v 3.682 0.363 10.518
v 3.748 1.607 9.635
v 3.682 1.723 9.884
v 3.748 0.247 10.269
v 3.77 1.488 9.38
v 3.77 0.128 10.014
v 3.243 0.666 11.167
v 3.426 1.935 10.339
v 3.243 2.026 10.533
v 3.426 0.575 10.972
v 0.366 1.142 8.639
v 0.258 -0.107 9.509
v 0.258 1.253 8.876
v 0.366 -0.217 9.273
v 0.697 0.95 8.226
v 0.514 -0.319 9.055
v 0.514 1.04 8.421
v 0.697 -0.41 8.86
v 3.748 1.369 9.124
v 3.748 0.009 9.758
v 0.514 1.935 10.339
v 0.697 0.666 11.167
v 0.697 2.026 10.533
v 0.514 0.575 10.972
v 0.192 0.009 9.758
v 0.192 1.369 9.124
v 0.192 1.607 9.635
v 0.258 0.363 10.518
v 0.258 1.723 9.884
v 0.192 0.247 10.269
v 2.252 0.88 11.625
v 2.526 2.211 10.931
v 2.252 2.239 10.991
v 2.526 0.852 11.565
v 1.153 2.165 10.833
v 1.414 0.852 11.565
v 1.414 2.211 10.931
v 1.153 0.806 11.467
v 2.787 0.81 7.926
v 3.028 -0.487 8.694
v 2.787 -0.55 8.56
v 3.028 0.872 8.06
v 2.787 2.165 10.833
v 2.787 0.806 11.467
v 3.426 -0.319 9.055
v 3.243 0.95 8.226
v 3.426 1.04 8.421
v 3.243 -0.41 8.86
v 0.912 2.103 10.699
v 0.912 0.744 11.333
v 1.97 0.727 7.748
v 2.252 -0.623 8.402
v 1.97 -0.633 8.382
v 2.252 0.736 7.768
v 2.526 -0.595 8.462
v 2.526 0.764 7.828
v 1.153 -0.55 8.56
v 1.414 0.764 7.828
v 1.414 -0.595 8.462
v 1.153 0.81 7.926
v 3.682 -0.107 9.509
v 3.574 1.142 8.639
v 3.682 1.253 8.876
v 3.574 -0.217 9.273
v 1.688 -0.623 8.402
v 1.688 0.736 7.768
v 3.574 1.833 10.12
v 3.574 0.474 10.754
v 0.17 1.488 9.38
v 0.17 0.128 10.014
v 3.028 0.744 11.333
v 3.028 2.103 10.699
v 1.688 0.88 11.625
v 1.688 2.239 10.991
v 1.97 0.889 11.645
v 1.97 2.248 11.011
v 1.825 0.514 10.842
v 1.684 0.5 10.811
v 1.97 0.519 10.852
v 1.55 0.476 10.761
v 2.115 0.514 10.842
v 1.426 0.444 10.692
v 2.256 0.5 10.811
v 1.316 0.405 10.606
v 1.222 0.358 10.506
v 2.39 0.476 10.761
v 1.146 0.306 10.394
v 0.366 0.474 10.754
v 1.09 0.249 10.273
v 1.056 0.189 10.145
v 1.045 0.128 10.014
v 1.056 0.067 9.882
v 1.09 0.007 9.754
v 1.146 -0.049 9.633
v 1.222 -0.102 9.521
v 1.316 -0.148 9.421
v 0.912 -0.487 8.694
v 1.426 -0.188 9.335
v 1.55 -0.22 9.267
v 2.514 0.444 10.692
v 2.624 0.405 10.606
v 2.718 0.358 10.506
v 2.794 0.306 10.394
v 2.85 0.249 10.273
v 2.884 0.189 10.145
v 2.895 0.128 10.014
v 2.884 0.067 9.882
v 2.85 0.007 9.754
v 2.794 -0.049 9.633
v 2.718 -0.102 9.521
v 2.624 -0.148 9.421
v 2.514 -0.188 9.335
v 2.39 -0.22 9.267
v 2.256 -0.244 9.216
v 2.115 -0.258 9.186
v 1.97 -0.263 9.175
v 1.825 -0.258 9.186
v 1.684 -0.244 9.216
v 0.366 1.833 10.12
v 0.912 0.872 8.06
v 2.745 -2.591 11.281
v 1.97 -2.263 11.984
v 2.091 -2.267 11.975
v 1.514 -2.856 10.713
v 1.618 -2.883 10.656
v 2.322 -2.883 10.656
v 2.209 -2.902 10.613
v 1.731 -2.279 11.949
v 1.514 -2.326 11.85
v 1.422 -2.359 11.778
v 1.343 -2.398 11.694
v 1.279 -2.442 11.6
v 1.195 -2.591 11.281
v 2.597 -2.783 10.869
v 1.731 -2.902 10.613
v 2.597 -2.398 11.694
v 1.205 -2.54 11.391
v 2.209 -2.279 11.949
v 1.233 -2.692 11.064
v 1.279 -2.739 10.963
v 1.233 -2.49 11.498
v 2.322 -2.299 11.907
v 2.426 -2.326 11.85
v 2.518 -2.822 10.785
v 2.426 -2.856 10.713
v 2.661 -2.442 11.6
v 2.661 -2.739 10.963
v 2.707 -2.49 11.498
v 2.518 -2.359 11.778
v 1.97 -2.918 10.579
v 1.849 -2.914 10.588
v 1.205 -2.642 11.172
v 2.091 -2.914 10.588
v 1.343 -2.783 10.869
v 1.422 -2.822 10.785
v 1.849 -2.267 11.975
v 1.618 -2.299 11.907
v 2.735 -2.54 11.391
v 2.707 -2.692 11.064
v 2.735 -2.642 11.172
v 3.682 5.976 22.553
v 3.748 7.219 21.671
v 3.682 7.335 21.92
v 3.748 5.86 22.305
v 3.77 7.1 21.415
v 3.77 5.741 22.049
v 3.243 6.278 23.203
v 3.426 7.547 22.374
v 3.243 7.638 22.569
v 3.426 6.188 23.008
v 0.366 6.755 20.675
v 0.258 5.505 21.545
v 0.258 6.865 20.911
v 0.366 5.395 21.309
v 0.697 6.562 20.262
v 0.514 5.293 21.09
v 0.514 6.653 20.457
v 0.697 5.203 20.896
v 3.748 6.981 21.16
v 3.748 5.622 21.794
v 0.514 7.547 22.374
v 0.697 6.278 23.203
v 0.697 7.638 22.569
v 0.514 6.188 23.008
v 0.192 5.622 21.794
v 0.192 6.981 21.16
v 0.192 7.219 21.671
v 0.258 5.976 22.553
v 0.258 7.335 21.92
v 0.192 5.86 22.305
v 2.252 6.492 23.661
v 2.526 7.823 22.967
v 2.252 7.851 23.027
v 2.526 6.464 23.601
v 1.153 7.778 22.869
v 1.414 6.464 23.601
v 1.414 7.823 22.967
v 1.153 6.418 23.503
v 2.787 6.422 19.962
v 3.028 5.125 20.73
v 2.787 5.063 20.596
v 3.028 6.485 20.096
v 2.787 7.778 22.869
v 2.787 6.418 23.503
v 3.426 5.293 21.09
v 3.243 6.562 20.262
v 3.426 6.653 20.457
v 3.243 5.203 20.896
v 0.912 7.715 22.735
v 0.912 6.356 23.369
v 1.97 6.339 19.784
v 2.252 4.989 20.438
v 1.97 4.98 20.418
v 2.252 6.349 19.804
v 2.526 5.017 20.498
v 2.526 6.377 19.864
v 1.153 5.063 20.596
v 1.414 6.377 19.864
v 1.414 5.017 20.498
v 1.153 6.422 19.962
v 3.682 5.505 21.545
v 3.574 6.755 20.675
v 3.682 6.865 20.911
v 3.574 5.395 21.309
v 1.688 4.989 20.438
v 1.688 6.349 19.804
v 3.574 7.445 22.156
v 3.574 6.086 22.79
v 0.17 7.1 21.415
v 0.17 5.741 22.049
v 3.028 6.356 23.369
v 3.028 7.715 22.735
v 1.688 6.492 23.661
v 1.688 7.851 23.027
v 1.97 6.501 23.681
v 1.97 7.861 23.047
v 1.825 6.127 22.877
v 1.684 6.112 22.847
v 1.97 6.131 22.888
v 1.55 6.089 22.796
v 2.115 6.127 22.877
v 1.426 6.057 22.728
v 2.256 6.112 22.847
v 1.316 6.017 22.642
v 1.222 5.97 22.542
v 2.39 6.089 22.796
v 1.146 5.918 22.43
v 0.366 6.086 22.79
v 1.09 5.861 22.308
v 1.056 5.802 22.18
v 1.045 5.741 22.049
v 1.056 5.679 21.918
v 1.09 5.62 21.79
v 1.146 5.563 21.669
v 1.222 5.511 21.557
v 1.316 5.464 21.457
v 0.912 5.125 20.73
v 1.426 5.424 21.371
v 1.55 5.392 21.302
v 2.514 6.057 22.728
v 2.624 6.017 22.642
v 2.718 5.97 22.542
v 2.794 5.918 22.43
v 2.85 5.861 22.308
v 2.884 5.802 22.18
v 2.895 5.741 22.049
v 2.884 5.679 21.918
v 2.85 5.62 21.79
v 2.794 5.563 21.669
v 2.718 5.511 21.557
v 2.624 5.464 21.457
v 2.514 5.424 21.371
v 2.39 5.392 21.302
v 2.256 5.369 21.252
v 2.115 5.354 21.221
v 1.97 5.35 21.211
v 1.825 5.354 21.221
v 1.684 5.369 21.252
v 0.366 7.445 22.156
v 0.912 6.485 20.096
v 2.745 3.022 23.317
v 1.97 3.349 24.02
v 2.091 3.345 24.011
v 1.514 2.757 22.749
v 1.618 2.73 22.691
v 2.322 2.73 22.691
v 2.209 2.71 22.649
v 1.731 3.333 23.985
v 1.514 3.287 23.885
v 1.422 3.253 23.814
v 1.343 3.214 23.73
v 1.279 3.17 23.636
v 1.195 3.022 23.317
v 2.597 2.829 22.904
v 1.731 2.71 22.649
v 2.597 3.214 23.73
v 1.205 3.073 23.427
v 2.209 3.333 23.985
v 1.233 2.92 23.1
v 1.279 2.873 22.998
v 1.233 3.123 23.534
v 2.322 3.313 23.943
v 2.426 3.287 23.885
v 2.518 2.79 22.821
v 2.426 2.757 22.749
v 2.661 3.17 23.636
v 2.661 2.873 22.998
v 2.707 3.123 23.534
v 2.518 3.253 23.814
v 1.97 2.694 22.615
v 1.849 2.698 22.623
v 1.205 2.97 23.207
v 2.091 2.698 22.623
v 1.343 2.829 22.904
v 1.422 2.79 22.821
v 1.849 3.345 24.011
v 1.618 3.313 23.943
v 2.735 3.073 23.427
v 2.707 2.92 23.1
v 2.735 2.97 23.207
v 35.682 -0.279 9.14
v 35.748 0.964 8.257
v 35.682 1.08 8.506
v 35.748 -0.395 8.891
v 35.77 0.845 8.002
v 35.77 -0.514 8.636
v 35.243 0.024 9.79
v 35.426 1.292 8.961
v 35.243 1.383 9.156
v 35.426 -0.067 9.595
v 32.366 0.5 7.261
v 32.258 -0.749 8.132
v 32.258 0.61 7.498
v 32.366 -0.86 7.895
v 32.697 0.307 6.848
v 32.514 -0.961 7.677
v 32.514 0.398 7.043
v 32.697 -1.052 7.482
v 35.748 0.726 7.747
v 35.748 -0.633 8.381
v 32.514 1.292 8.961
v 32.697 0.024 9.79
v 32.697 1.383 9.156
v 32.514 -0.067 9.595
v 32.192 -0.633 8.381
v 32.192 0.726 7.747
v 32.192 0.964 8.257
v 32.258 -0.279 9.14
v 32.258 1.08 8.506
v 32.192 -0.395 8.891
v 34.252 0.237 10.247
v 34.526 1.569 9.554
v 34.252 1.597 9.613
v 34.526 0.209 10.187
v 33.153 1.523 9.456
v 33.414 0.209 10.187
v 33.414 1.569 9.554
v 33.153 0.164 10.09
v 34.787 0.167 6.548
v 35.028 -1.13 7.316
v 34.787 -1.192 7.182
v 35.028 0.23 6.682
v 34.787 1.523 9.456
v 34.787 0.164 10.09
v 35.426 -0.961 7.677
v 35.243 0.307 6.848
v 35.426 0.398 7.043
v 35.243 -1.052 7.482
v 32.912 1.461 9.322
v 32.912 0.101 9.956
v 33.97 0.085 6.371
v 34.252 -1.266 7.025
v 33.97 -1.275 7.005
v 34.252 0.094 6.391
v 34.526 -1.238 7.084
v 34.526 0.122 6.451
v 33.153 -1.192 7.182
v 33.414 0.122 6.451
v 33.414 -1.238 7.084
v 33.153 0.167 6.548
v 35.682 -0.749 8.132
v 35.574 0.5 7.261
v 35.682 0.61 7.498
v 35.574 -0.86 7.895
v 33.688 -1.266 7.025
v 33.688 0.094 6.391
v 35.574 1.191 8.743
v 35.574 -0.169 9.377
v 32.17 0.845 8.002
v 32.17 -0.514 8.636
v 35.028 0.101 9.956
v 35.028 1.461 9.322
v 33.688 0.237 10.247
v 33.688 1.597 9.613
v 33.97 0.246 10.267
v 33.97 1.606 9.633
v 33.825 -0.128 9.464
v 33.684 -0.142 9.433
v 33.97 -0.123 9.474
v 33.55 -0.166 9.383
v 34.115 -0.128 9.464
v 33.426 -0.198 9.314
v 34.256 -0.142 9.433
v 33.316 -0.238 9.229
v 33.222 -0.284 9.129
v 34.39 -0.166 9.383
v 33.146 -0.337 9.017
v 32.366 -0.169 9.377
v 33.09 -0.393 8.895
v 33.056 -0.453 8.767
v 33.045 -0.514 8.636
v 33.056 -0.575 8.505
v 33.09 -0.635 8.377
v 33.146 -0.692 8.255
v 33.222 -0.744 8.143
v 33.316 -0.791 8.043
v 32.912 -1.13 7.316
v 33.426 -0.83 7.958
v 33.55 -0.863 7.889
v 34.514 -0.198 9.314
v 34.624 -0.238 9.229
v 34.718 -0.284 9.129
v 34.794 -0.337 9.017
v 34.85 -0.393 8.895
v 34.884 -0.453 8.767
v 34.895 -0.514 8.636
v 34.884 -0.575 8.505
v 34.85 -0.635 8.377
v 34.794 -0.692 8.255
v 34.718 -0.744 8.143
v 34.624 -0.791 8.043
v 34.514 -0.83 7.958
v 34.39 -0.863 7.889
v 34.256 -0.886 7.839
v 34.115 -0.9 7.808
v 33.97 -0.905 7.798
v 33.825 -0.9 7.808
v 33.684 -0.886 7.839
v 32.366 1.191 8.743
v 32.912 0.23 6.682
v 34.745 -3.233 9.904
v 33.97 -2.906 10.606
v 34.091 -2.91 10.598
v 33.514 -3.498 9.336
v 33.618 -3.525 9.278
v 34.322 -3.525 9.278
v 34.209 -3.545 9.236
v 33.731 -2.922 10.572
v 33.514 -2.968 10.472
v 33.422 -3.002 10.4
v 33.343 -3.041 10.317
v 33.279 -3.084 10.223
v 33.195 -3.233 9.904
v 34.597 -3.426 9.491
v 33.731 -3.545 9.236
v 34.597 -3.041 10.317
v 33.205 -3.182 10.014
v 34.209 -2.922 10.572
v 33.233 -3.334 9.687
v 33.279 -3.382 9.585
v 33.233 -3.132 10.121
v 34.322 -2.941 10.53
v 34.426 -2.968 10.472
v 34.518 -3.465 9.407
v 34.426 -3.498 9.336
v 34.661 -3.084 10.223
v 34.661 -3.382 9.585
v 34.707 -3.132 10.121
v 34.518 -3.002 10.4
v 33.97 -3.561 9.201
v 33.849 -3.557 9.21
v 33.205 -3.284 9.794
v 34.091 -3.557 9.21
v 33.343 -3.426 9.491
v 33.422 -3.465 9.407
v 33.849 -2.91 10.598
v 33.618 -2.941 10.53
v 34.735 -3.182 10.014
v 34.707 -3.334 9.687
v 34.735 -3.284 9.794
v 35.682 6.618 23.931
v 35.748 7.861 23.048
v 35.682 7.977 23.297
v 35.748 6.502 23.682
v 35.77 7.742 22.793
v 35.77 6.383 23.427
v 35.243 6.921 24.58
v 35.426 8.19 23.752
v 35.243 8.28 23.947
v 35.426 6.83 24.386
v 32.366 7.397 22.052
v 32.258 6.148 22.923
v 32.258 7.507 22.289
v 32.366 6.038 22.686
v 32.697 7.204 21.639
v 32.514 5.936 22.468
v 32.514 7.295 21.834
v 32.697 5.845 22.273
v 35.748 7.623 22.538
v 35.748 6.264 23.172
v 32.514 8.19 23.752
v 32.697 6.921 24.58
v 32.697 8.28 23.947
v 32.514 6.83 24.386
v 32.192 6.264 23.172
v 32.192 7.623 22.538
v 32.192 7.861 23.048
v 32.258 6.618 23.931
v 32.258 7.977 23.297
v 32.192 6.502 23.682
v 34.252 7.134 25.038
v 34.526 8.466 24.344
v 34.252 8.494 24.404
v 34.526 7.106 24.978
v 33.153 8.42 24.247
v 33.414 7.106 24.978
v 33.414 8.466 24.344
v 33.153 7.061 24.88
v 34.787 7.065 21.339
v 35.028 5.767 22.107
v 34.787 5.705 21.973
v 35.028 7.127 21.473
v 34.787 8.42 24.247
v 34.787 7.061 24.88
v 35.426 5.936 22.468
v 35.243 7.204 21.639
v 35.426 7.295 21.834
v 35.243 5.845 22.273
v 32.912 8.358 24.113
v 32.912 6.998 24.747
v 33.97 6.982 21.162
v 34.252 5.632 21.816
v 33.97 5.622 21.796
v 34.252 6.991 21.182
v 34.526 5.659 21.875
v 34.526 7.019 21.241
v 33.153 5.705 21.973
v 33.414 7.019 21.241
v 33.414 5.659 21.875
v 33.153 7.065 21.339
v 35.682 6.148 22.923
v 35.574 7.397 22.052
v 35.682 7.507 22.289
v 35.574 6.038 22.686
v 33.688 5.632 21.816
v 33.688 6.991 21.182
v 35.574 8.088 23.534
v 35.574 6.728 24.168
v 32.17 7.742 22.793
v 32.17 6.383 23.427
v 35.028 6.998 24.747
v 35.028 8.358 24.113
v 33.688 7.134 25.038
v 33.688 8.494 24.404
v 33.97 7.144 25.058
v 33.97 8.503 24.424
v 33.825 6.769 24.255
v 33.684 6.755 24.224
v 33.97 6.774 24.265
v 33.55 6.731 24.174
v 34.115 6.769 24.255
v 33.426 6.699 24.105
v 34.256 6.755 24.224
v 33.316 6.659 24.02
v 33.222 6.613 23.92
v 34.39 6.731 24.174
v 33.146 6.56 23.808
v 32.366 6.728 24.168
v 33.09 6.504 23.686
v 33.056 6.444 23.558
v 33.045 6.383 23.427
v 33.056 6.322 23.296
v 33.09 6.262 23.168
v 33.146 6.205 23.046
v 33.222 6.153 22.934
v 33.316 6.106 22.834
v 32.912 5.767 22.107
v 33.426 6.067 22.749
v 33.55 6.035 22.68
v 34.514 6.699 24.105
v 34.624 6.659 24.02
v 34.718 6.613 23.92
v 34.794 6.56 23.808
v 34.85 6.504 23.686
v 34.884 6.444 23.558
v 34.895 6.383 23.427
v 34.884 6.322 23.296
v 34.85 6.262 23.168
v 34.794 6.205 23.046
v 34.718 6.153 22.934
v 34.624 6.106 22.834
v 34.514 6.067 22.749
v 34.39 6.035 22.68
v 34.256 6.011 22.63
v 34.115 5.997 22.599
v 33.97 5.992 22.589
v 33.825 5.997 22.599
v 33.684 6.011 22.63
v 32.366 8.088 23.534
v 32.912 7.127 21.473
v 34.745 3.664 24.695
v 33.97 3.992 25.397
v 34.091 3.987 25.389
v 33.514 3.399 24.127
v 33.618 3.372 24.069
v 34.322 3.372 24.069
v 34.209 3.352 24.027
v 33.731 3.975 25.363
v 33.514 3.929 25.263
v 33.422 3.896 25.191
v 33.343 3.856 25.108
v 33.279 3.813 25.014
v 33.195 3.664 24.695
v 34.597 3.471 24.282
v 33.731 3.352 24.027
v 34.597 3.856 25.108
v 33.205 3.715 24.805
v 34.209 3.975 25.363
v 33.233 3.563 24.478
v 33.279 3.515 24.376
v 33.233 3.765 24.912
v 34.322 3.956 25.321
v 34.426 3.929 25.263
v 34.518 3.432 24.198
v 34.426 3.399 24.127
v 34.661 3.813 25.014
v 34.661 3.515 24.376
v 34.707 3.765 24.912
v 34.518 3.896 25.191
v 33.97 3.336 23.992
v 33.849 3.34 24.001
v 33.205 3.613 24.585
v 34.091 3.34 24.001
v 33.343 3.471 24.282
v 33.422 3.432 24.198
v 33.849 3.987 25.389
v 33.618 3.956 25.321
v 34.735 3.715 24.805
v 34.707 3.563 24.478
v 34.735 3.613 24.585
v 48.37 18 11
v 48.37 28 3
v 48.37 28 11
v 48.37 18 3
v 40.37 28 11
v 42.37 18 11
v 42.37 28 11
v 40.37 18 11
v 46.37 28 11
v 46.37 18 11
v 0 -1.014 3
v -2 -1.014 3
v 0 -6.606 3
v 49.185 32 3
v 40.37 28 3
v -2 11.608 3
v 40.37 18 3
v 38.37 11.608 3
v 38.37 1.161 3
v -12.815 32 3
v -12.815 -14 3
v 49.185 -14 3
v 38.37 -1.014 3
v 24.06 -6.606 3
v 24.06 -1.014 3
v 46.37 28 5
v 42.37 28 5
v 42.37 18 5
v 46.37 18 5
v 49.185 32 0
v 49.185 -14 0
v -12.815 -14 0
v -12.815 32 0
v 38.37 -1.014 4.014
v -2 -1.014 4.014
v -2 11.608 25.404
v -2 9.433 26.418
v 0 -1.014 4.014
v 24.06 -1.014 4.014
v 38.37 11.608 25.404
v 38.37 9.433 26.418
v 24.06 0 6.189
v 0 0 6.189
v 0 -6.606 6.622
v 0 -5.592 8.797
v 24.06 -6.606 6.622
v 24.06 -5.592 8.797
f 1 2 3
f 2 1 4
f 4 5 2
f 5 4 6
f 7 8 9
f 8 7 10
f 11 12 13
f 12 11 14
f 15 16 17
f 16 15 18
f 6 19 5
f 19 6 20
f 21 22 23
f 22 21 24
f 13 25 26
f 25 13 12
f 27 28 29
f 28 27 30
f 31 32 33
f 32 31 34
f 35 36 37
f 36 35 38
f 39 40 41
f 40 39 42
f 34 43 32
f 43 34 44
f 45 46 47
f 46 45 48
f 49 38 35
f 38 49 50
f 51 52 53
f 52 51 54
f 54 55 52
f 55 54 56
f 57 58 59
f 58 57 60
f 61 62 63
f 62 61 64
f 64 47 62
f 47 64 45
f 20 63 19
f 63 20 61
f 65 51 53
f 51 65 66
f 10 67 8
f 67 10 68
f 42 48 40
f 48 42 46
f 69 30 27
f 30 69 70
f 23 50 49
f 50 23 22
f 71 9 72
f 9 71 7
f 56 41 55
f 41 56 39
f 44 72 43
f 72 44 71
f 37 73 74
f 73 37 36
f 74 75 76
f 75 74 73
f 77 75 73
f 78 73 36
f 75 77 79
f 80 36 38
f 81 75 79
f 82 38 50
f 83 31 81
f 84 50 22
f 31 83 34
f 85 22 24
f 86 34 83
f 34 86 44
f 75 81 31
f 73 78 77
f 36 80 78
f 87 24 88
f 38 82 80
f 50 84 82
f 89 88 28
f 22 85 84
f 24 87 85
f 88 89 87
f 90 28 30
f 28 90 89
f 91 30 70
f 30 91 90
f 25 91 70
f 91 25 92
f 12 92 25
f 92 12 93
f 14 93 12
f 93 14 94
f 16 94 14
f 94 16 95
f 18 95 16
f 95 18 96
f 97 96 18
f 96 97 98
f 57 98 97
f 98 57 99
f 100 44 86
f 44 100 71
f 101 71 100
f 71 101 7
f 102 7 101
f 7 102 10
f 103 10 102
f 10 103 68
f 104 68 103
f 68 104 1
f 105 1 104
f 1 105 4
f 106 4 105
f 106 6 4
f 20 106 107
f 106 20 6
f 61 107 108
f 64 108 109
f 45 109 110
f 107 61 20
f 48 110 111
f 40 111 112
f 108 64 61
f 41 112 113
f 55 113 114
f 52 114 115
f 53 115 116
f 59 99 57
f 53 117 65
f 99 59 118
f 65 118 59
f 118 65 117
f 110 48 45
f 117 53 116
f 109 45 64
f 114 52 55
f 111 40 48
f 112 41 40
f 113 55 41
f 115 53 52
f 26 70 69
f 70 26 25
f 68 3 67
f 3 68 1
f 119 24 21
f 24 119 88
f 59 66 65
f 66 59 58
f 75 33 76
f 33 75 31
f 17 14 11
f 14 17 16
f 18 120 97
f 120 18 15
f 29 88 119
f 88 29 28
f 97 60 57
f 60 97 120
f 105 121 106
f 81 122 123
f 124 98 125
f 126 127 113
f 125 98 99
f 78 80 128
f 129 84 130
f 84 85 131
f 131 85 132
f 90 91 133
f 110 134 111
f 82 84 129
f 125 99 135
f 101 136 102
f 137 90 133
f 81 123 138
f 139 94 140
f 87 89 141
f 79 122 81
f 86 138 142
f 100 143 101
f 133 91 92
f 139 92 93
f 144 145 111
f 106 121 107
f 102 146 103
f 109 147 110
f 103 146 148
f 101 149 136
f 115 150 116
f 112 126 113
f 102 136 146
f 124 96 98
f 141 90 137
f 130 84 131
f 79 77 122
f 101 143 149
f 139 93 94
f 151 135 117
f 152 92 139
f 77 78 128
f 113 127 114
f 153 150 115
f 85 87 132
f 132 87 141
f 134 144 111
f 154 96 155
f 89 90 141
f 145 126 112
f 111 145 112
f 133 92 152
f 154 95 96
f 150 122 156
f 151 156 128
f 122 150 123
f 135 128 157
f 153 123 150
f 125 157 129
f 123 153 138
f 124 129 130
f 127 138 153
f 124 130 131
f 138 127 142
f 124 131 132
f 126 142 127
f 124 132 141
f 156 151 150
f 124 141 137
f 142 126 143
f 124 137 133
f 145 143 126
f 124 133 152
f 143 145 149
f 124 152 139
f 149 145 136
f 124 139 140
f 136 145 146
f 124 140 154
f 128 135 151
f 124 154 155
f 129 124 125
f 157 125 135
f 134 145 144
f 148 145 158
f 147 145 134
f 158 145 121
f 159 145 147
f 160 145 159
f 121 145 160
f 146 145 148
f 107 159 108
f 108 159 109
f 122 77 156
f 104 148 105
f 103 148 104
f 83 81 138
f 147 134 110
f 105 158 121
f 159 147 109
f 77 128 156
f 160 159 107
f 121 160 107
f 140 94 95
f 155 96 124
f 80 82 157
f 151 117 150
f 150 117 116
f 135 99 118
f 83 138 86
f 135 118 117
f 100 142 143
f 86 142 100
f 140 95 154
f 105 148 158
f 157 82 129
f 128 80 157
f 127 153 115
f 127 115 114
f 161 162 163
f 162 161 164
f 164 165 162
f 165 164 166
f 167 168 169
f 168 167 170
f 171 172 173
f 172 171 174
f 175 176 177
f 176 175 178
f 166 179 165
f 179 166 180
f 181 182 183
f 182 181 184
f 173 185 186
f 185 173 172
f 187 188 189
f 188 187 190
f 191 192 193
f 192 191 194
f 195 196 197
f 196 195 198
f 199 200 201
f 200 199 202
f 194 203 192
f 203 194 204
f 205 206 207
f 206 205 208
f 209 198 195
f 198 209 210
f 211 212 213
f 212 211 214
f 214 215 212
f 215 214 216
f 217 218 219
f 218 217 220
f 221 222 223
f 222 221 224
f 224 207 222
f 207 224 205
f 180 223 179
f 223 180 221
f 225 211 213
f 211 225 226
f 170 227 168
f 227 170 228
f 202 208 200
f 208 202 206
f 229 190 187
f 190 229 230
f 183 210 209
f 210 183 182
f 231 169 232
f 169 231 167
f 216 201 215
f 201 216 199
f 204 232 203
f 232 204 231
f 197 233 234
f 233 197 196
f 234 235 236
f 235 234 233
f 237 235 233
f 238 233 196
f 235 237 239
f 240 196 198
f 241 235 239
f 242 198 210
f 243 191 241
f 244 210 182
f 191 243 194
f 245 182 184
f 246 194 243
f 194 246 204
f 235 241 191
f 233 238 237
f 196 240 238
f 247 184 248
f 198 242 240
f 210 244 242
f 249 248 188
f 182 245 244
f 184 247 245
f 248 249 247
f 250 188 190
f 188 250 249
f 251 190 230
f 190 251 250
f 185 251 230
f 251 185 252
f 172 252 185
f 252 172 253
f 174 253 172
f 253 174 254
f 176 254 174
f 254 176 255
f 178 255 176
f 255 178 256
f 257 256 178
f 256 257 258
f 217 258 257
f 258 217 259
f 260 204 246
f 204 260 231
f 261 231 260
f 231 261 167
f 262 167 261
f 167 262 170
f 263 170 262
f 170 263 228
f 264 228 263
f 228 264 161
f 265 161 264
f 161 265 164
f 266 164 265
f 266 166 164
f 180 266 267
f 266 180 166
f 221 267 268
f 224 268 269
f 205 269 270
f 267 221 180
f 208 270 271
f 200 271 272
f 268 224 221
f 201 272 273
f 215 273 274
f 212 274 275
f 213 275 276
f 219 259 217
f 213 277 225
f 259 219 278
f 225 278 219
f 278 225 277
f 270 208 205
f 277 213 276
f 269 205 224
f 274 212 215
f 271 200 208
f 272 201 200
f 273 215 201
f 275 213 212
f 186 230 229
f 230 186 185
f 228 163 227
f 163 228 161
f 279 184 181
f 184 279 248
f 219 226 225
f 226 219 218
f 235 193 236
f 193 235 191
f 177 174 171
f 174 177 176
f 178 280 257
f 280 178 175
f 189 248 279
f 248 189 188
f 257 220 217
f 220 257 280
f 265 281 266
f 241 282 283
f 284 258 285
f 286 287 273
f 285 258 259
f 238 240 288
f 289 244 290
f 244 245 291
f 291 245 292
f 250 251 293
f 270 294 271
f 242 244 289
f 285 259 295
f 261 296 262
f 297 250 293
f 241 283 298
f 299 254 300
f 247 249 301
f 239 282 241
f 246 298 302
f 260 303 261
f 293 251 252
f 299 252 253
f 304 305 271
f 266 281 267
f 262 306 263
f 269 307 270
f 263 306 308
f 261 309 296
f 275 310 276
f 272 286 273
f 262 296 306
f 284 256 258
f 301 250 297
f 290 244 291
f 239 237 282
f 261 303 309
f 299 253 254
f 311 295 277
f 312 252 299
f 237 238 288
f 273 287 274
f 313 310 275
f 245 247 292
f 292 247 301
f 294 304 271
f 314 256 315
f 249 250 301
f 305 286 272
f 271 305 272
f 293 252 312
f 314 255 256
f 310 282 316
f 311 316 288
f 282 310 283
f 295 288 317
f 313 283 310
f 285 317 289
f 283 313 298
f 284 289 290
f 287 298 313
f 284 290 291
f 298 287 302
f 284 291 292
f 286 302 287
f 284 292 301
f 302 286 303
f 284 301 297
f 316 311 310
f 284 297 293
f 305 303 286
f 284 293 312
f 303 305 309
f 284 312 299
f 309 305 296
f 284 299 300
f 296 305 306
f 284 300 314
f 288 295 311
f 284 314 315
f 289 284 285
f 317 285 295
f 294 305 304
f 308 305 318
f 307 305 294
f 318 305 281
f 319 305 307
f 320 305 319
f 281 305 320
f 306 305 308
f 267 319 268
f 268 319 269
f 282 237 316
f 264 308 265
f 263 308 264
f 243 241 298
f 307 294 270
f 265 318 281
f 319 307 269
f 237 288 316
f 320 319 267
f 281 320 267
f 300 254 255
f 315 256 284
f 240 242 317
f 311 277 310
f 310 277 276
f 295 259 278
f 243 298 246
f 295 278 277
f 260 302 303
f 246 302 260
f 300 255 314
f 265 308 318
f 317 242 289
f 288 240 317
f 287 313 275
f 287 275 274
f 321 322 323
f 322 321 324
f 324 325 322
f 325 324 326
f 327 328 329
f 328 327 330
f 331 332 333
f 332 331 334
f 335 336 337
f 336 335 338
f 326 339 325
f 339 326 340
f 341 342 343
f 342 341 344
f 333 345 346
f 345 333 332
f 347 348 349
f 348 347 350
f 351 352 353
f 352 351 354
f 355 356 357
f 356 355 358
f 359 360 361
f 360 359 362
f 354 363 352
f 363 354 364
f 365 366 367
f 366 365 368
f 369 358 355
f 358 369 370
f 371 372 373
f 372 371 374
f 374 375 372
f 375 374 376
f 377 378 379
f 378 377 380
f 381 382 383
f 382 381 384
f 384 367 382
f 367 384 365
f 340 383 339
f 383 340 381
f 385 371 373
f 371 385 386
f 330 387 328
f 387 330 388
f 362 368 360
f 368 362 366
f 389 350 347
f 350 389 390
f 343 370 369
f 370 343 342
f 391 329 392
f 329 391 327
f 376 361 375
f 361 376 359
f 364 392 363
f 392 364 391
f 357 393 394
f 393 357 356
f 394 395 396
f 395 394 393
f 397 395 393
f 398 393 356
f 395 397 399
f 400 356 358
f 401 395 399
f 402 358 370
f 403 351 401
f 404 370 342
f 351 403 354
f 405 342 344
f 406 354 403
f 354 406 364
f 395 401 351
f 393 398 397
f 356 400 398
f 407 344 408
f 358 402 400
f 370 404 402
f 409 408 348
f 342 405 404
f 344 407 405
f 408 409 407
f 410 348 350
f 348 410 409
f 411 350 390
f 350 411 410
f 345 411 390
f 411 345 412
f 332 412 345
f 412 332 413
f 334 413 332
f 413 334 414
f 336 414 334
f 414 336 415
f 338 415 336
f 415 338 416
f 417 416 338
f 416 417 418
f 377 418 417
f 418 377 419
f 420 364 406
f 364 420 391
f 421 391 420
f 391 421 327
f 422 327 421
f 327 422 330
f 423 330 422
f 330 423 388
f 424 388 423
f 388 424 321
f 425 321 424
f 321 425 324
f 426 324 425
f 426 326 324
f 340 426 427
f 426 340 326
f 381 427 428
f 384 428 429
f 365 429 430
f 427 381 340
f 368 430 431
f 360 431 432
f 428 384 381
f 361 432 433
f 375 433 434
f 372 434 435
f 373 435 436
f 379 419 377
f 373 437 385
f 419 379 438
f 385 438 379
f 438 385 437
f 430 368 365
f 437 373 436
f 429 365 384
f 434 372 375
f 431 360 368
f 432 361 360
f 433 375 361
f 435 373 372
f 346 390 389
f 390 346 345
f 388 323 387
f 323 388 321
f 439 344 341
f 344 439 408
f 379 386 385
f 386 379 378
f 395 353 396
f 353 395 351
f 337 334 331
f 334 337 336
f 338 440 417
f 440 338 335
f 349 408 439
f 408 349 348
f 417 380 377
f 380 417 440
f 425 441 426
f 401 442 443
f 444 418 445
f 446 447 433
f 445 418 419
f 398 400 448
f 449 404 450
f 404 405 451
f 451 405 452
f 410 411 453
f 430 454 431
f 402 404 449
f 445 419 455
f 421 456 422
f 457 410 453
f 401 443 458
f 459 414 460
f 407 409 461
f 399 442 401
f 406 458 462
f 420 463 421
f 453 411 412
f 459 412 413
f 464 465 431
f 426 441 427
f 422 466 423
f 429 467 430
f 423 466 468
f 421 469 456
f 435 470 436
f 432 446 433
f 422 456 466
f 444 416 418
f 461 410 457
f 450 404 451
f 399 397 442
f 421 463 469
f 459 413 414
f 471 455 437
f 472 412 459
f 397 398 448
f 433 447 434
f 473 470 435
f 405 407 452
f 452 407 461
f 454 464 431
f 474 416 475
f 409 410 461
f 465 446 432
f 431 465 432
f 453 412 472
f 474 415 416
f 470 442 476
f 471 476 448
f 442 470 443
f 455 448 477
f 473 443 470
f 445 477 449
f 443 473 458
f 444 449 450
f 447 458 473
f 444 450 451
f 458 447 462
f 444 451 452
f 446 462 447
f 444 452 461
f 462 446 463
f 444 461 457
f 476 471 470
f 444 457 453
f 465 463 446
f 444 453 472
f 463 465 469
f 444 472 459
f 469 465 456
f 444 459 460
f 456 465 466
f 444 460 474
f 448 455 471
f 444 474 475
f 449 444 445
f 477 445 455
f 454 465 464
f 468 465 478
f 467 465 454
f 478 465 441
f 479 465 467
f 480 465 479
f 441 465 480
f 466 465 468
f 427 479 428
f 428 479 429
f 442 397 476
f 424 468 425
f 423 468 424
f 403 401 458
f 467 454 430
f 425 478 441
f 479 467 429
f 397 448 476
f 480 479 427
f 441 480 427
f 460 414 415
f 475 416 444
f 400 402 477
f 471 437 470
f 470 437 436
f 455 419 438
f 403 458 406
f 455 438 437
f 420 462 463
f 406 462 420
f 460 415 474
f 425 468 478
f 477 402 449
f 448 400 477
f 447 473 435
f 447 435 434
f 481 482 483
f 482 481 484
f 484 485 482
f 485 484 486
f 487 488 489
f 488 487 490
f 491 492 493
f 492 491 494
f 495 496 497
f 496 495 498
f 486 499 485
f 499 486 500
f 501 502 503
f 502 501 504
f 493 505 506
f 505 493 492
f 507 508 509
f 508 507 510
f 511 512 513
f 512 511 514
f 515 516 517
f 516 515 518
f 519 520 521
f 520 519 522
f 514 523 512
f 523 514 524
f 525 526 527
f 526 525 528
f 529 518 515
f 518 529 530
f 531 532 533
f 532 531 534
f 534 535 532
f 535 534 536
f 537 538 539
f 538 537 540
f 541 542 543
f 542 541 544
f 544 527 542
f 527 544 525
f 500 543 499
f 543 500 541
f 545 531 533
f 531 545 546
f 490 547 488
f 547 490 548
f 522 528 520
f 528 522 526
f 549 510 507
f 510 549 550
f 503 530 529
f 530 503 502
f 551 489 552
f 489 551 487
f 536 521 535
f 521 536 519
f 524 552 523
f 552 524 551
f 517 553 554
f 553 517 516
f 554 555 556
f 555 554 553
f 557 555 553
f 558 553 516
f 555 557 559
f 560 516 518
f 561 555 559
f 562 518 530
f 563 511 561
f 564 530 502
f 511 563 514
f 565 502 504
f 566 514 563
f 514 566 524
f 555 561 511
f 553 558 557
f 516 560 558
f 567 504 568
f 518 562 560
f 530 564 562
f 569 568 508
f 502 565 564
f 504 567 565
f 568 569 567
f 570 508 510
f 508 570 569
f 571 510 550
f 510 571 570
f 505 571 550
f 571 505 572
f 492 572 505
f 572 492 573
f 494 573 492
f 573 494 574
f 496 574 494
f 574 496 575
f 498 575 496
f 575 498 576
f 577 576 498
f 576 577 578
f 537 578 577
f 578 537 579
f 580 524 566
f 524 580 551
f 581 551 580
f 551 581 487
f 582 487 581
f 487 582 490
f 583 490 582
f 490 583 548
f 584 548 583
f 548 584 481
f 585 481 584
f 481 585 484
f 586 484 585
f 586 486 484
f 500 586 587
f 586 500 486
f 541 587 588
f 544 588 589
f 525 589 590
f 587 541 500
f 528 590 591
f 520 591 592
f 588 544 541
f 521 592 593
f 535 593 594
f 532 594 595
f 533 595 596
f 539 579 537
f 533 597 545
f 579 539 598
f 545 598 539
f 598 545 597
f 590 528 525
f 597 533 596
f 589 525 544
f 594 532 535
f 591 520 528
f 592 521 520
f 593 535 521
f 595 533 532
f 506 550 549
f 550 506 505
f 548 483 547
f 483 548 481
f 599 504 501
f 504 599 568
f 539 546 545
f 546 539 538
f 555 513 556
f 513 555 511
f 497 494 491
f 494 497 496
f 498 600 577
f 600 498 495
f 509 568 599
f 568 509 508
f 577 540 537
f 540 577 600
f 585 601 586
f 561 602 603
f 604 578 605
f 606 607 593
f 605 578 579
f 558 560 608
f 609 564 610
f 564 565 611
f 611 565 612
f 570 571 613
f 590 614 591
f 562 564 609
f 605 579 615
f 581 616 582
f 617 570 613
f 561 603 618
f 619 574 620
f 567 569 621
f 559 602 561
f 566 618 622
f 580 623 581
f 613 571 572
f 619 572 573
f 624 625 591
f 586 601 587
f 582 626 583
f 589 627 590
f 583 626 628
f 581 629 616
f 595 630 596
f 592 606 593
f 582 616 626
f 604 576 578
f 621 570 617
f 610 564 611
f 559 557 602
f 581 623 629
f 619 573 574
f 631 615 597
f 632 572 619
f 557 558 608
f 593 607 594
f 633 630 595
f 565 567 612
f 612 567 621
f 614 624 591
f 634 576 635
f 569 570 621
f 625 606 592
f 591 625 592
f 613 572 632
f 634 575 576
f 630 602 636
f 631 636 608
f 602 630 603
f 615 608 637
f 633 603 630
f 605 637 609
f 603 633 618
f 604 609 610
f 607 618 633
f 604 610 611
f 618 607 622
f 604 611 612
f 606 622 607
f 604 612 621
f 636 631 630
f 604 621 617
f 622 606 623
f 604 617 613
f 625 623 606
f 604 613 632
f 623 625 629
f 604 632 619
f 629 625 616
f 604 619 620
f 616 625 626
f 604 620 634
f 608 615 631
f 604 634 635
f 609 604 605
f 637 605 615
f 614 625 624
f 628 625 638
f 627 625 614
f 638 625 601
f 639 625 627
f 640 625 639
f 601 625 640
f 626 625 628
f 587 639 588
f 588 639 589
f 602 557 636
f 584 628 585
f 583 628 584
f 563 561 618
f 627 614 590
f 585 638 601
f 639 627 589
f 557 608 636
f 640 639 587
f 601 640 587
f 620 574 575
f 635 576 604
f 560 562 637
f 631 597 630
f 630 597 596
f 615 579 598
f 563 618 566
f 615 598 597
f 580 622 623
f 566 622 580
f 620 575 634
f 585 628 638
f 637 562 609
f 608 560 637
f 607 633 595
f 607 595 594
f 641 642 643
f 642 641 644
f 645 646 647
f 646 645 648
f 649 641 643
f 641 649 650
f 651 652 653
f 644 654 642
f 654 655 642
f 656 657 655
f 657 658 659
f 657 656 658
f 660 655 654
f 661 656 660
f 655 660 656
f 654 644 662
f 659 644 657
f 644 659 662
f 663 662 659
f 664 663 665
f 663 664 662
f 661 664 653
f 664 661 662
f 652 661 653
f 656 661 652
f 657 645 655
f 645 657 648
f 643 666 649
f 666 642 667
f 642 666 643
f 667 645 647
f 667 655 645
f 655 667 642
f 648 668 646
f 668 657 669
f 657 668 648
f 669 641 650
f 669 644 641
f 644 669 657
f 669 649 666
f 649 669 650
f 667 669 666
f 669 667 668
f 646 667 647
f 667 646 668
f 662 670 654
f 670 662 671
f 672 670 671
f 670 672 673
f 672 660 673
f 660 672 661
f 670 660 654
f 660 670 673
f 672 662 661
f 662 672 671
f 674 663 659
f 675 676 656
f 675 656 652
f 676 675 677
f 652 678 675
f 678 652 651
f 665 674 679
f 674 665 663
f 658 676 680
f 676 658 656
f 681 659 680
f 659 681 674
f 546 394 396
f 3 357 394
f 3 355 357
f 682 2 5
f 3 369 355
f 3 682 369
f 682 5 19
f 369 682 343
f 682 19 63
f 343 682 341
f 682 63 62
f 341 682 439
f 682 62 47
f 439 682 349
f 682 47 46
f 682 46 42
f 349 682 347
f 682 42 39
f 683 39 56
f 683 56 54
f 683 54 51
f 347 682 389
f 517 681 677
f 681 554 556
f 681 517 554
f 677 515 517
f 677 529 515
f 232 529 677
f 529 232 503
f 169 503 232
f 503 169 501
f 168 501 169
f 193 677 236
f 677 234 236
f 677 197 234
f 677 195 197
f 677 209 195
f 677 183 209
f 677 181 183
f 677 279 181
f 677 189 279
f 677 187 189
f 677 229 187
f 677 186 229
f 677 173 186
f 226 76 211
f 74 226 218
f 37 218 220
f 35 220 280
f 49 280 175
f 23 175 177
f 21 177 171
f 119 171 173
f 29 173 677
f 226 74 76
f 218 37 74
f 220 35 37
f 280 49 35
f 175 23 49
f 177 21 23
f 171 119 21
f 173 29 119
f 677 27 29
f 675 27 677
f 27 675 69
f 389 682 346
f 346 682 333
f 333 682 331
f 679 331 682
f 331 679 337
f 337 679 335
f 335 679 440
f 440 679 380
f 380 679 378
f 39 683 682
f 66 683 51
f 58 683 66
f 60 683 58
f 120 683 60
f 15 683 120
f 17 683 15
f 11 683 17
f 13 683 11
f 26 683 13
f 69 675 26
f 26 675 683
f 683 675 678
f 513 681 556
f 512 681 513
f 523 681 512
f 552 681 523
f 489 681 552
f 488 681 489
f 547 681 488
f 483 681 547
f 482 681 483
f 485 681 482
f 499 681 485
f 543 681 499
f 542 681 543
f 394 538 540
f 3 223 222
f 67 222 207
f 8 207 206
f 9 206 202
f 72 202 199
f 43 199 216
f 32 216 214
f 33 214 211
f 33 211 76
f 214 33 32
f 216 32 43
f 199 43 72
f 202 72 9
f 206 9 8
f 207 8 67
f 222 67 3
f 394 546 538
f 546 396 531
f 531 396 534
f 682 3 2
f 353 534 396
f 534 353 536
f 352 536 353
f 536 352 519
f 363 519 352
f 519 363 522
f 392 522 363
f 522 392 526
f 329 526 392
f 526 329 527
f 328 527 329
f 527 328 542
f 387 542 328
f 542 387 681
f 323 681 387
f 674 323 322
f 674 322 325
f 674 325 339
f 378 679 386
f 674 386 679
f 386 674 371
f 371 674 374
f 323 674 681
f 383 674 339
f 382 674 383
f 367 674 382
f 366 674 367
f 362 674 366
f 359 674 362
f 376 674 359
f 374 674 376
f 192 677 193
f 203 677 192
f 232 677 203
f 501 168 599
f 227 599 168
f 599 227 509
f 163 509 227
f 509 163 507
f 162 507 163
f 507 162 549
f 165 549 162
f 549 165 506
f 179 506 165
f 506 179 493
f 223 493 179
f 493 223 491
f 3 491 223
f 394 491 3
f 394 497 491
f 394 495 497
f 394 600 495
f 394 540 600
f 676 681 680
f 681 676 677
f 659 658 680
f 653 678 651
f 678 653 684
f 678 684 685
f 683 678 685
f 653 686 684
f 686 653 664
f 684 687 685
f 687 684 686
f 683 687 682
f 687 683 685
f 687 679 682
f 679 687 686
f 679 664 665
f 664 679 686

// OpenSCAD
// Stand inclinado sem parafuso para a Waveshare ESP32-S3-LCD-1.47B (paisagem, USB-C à direita).
// Inspirado no "Waveshare ESP32-C6 1.47 — Landscape stand" (https://makerworld.com/en/models/3408098):
// 65° em relação à mesa, cabo saindo pela direita, BOOT e RST livres.
//
// Encaixe: os 4 espaçadores de latão das costas da placa entram em 4 pinos impressos (pressão).
// Uma prateleira sob a borda de baixo segura o peso. Imprima primeiro part="teste" para acertar
// pino_d: o pino deve entrar firme com o dedo, sem precisar de força.
//
// Medidas da placa: https://www.waveshare.com/img/devkit/ESP32-S3-LCD-1.47B/ESP32-S3-LCD-1.47B-details-size.jpg
//
// Renderizar:
//   openscad -D 'part="stand"' -o stand.stl stand-waveshare-s3-lcd-147b.scad
//   openscad -D 'part="teste"' -o teste.stl stand-waveshare-s3-lcd-147b.scad

part = "stand";  // "stand" ou "teste"

// --- placa (vista de frente, USB-C à direita, origem no canto inferior esquerdo da PCB) ---
pcb_w = 36.37;
pcb_h = 20.32;
pcb_t = 1.0;           // espessura da PCB; meça se puder (1,0 a 1,6)
espacador_h = 2.17;    // quanto os espaçadores de latão saem das costas da PCB (medido com paquímetro)
furos = [              // centros dos furos M2
  [1.97, 3.52], [1.97, pcb_h - 3.52],
  [pcb_w - 2.40, 2.00], [pcb_w - 2.40, pcb_h - 2.00],
];
zona_botoes = 11.31;   // BOOT e RST ficam nos últimos 11,31 mm do lado do USB-C

// --- encaixe (calibre com a peça de teste) ---
pino_d = 1.85;         // M2: entra na rosca por pressão. Solto: aumente 0,05. Não entra: diminua 0,05
pino_len = 3.0;
ressalto_d = 3.6;      // apoio onde a ponta do espaçador encosta
ressalto_h = 1.5;      // folga extra para os componentes das costas

// --- stand ---
inclinacao = 65;       // graus em relação à mesa
placa_t = 2.4;         // espessura da chapa de trás
margem = 2.0;
base_w = 62;
base_d = 46;
base_t = 3.0;

$fn = 40;

module pino() {  // ressalto onde a ponta do espaçador encosta + pino que entra na rosca
  translate([0, 0, -0.2]) cylinder(d = ressalto_d, h = ressalto_h + 0.2);  // afunda na chapa para fundir depois da rotação
  translate([0, 0, ressalto_h]) cylinder(d1 = pino_d, d2 = pino_d - 0.3, h = pino_len);
}

prateleira_alt = 2.4;                                      // espessura da prateleira
prateleira_prof = ressalto_h + espacador_h + pcb_t + 1.5;  // vai até 1,5 mm à frente da PCB
prateleira_x = pcb_w - zona_botoes - 1;                    // para antes do RST

// Peças do painel no plano XY; a frente da placa aponta para +Z.
module chapa() {
  translate([-margem, -prateleira_alt, -placa_t])
    cube([pcb_w + 2 * margem, pcb_h + margem + prateleira_alt, placa_t]);
}
module prateleira() {
  translate([0, -prateleira_alt, -placa_t]) cube([prateleira_x, prateleira_alt, placa_t + prateleira_prof]);
}
module pinos() { for (f = furos) translate([f[0], f[1], 0]) pino(); }

// Coloca uma peça do painel inclinada, com o ponto mais baixo encostado na base.
module inclinado() {
  sobe = prateleira_alt * sin(inclinacao) + placa_t * cos(inclinacao);
  translate([0, 0, base_t + sobe]) rotate([inclinacao, 0, 0]) children();
}

// Preenche da peça inclinada até a base: tudo vira rampa e imprime sem suporte.
module ate_a_base() {
  hull() {
    inclinado() children();
    translate([0, 0, base_t - 0.01]) linear_extrude(0.01) projection() inclinado() children();
  }
}

module stand() {
  base_x0 = -(base_w - pcb_w) / 2;
  translate([base_x0, -14, 0]) cube([base_w, base_d, base_t]);
  ate_a_base() chapa();       // só atrás da chapa: a frente fica livre para a placa
  ate_a_base() prateleira();  // a prateleira tem a própria rampa embaixo
  inclinado() pinos();
  // gancho do cabo atrás, à direita: o cabo sai do USB-C, desce e passa por aqui
  translate([pcb_w + margem + 2, 18, base_t]) difference() {
    cube([8, 10, 8]);
    translate([2, -1, 2]) cube([4, 12, 7]);
  }
}

module teste() {
  // só a chapa com os pinos e a prateleira, impressa deitada: ~5 min
  chapa();
  prateleira();
  pinos();
}

if (part == "teste") teste();
else stand();
